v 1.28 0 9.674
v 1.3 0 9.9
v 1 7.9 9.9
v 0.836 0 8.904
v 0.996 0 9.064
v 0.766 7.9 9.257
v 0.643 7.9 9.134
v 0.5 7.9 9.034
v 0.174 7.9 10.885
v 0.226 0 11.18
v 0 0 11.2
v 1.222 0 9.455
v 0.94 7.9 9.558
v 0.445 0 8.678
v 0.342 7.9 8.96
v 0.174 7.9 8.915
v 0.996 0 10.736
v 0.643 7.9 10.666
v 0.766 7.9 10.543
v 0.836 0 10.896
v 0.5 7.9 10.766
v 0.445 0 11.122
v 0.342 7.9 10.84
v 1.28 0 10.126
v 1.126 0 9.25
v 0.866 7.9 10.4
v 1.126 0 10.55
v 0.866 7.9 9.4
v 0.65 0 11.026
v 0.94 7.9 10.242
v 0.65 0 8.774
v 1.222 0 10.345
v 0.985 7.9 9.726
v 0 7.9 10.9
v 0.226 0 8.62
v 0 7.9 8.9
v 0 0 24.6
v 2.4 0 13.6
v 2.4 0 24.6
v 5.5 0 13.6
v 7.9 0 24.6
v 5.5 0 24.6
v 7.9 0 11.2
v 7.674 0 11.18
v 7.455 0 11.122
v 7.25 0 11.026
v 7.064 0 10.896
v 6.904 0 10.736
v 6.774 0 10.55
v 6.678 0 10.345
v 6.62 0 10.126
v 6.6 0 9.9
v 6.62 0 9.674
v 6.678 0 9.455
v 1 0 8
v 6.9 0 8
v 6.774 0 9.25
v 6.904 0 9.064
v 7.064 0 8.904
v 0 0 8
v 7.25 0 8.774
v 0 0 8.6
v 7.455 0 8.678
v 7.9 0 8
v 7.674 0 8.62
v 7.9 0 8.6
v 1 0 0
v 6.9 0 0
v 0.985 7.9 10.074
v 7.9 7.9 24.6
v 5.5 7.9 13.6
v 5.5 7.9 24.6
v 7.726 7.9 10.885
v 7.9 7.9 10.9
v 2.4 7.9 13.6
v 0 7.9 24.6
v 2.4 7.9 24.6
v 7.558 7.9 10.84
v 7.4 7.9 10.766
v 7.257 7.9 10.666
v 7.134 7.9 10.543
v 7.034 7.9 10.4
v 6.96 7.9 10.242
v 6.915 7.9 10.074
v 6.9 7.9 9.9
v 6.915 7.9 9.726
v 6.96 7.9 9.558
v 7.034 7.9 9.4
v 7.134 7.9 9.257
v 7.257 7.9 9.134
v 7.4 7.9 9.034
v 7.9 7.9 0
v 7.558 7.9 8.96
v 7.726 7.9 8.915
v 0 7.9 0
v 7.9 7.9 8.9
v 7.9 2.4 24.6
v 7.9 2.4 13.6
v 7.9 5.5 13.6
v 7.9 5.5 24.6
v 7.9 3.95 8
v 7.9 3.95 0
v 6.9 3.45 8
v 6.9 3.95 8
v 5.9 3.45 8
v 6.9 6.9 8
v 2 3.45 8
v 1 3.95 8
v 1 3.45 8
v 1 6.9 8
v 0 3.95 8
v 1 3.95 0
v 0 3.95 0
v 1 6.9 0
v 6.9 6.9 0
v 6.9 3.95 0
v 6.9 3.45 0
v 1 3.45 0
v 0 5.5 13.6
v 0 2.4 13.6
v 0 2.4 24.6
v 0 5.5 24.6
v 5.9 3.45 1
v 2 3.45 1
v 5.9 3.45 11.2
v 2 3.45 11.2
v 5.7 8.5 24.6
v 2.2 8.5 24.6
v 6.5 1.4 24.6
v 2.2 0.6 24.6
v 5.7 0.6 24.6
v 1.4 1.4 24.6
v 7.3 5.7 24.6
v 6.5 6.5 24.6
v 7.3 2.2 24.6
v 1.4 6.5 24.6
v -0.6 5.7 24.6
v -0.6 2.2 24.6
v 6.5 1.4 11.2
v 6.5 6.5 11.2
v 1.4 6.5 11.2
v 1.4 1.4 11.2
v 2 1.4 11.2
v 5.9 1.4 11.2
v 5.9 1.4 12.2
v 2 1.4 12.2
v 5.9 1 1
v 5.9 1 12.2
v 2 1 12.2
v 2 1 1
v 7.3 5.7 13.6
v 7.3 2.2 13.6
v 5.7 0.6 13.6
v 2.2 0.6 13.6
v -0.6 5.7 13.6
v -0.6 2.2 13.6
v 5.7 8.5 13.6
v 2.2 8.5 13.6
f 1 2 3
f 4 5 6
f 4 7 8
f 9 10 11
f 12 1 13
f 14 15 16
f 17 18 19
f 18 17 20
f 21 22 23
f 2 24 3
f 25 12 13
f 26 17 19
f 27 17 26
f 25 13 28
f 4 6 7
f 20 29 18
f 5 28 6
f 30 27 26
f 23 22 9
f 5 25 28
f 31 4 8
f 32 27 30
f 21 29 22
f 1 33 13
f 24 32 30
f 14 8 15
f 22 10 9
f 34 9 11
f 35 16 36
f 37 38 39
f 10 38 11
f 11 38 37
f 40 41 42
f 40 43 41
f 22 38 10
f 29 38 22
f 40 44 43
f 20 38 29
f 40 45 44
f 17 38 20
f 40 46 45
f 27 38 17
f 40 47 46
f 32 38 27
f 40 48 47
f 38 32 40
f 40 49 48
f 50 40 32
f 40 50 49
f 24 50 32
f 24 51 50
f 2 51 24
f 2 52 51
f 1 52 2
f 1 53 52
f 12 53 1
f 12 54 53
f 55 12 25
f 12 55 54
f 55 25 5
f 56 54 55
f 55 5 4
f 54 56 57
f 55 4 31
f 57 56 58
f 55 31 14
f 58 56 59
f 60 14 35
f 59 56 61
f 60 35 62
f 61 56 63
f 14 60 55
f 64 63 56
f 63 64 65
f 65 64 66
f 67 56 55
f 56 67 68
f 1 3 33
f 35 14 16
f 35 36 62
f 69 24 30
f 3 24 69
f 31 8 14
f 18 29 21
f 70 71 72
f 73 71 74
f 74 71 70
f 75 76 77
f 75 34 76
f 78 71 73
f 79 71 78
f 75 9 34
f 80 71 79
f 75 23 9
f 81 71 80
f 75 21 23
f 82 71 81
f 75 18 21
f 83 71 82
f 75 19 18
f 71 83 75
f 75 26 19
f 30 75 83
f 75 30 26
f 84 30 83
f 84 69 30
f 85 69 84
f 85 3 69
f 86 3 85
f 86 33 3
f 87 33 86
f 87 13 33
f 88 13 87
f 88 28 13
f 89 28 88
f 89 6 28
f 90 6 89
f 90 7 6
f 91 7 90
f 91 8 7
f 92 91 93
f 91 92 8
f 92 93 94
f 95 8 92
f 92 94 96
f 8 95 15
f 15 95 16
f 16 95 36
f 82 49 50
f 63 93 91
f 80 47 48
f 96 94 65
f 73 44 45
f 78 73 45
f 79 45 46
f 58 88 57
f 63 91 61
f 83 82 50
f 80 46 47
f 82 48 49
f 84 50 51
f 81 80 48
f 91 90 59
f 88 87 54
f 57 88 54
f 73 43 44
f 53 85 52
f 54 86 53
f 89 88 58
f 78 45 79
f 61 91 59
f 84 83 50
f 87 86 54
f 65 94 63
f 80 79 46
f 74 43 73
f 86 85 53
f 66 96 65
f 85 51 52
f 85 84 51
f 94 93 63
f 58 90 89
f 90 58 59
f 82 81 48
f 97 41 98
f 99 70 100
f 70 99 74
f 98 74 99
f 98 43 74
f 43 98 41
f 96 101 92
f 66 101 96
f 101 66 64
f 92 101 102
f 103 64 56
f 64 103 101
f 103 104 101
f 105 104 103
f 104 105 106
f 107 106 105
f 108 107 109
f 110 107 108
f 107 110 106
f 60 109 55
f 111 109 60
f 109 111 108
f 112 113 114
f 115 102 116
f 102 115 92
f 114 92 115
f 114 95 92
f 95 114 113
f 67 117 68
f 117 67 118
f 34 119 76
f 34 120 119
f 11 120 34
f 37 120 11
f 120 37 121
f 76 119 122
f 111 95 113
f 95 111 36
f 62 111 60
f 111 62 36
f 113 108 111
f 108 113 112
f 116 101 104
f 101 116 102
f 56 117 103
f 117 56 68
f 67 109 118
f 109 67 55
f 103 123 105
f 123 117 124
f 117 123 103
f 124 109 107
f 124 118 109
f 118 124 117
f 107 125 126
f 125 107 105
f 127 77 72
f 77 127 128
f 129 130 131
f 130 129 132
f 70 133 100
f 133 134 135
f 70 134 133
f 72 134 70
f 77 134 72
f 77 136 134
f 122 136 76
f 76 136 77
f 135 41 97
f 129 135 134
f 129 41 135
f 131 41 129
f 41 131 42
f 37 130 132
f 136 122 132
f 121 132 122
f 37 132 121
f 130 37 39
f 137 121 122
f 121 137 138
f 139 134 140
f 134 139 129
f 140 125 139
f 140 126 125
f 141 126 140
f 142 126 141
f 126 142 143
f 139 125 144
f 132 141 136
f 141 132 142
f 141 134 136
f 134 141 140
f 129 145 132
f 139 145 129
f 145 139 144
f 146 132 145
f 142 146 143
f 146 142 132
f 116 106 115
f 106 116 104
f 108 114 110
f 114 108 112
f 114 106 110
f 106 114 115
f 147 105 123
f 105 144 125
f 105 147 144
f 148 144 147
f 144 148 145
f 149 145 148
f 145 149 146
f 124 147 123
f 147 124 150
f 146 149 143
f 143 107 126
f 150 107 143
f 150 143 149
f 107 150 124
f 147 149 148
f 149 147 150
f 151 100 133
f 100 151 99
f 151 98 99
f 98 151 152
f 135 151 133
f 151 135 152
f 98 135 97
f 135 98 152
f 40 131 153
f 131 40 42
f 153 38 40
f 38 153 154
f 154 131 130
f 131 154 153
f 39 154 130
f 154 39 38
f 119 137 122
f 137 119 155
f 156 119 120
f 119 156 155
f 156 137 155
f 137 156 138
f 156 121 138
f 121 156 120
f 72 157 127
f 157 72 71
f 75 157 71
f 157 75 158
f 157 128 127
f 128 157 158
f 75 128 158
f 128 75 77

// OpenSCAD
length=24.6;
side=7.9;
inside=5.1;
round_to_tip=9.9;
round_radius=1.3;
pair_length=41.2;
tip_wall=1; // FIXME measure

groove_small = 3.1;
groove_large = 3.5;
groove_depth = 0.6;
groove_length = 11.0;

overlap=2*length - pair_length;
wall = (side-inside)/2;
tip_side = side - 2*tip_wall;
tip_depth = round_to_tip - round_radius;

module groove(){
	linear_extrude(groove_length)
	polygon([
		[0,-groove_small/2],
		[0,groove_small/2],
		[-groove_depth, groove_large/2],
		[-groove_depth,-groove_large/2],
	]);
}

difference(){
	cube([side,side,length]);
	// wire port
	translate([wall,wall,round_to_tip+round_radius]) cube([inside,inside,length]);
	// side holes
	for(i=[0,side]) // fixme
		translate([i, 0, round_to_tip]) rotate([-90,0,0]) cylinder(side,round_radius,$fn=36);
	// cutout for opposite shell
	difference(){
		cube([side, side/2, overlap]);
		// tongue
		translate([tip_wall,0,0]) cube([tip_side, tip_side/2+tip_wall/2, tip_depth]);
	};
	// cutout for opposite tongue
	translate([tip_wall,side/2,0]) cube([tip_side, tip_side/2, overlap]);
	// tongue hole through to back
	translate([tip_wall*2,tip_wall,tip_wall]) cube([tip_side-2*tip_wall,tip_side/2-tip_wall/2,round_to_tip+round_radius]);
	// grooves
	translate([side, side/2, length-groove_length]) groove();
	translate([side/2, 0, length-groove_length]) rotate([0,0,-90]) groove();
}
translate([0, side/2, length-groove_length]) groove();
translate([side/2, side, length-groove_length]) rotate([0,0,-90]) groove();
